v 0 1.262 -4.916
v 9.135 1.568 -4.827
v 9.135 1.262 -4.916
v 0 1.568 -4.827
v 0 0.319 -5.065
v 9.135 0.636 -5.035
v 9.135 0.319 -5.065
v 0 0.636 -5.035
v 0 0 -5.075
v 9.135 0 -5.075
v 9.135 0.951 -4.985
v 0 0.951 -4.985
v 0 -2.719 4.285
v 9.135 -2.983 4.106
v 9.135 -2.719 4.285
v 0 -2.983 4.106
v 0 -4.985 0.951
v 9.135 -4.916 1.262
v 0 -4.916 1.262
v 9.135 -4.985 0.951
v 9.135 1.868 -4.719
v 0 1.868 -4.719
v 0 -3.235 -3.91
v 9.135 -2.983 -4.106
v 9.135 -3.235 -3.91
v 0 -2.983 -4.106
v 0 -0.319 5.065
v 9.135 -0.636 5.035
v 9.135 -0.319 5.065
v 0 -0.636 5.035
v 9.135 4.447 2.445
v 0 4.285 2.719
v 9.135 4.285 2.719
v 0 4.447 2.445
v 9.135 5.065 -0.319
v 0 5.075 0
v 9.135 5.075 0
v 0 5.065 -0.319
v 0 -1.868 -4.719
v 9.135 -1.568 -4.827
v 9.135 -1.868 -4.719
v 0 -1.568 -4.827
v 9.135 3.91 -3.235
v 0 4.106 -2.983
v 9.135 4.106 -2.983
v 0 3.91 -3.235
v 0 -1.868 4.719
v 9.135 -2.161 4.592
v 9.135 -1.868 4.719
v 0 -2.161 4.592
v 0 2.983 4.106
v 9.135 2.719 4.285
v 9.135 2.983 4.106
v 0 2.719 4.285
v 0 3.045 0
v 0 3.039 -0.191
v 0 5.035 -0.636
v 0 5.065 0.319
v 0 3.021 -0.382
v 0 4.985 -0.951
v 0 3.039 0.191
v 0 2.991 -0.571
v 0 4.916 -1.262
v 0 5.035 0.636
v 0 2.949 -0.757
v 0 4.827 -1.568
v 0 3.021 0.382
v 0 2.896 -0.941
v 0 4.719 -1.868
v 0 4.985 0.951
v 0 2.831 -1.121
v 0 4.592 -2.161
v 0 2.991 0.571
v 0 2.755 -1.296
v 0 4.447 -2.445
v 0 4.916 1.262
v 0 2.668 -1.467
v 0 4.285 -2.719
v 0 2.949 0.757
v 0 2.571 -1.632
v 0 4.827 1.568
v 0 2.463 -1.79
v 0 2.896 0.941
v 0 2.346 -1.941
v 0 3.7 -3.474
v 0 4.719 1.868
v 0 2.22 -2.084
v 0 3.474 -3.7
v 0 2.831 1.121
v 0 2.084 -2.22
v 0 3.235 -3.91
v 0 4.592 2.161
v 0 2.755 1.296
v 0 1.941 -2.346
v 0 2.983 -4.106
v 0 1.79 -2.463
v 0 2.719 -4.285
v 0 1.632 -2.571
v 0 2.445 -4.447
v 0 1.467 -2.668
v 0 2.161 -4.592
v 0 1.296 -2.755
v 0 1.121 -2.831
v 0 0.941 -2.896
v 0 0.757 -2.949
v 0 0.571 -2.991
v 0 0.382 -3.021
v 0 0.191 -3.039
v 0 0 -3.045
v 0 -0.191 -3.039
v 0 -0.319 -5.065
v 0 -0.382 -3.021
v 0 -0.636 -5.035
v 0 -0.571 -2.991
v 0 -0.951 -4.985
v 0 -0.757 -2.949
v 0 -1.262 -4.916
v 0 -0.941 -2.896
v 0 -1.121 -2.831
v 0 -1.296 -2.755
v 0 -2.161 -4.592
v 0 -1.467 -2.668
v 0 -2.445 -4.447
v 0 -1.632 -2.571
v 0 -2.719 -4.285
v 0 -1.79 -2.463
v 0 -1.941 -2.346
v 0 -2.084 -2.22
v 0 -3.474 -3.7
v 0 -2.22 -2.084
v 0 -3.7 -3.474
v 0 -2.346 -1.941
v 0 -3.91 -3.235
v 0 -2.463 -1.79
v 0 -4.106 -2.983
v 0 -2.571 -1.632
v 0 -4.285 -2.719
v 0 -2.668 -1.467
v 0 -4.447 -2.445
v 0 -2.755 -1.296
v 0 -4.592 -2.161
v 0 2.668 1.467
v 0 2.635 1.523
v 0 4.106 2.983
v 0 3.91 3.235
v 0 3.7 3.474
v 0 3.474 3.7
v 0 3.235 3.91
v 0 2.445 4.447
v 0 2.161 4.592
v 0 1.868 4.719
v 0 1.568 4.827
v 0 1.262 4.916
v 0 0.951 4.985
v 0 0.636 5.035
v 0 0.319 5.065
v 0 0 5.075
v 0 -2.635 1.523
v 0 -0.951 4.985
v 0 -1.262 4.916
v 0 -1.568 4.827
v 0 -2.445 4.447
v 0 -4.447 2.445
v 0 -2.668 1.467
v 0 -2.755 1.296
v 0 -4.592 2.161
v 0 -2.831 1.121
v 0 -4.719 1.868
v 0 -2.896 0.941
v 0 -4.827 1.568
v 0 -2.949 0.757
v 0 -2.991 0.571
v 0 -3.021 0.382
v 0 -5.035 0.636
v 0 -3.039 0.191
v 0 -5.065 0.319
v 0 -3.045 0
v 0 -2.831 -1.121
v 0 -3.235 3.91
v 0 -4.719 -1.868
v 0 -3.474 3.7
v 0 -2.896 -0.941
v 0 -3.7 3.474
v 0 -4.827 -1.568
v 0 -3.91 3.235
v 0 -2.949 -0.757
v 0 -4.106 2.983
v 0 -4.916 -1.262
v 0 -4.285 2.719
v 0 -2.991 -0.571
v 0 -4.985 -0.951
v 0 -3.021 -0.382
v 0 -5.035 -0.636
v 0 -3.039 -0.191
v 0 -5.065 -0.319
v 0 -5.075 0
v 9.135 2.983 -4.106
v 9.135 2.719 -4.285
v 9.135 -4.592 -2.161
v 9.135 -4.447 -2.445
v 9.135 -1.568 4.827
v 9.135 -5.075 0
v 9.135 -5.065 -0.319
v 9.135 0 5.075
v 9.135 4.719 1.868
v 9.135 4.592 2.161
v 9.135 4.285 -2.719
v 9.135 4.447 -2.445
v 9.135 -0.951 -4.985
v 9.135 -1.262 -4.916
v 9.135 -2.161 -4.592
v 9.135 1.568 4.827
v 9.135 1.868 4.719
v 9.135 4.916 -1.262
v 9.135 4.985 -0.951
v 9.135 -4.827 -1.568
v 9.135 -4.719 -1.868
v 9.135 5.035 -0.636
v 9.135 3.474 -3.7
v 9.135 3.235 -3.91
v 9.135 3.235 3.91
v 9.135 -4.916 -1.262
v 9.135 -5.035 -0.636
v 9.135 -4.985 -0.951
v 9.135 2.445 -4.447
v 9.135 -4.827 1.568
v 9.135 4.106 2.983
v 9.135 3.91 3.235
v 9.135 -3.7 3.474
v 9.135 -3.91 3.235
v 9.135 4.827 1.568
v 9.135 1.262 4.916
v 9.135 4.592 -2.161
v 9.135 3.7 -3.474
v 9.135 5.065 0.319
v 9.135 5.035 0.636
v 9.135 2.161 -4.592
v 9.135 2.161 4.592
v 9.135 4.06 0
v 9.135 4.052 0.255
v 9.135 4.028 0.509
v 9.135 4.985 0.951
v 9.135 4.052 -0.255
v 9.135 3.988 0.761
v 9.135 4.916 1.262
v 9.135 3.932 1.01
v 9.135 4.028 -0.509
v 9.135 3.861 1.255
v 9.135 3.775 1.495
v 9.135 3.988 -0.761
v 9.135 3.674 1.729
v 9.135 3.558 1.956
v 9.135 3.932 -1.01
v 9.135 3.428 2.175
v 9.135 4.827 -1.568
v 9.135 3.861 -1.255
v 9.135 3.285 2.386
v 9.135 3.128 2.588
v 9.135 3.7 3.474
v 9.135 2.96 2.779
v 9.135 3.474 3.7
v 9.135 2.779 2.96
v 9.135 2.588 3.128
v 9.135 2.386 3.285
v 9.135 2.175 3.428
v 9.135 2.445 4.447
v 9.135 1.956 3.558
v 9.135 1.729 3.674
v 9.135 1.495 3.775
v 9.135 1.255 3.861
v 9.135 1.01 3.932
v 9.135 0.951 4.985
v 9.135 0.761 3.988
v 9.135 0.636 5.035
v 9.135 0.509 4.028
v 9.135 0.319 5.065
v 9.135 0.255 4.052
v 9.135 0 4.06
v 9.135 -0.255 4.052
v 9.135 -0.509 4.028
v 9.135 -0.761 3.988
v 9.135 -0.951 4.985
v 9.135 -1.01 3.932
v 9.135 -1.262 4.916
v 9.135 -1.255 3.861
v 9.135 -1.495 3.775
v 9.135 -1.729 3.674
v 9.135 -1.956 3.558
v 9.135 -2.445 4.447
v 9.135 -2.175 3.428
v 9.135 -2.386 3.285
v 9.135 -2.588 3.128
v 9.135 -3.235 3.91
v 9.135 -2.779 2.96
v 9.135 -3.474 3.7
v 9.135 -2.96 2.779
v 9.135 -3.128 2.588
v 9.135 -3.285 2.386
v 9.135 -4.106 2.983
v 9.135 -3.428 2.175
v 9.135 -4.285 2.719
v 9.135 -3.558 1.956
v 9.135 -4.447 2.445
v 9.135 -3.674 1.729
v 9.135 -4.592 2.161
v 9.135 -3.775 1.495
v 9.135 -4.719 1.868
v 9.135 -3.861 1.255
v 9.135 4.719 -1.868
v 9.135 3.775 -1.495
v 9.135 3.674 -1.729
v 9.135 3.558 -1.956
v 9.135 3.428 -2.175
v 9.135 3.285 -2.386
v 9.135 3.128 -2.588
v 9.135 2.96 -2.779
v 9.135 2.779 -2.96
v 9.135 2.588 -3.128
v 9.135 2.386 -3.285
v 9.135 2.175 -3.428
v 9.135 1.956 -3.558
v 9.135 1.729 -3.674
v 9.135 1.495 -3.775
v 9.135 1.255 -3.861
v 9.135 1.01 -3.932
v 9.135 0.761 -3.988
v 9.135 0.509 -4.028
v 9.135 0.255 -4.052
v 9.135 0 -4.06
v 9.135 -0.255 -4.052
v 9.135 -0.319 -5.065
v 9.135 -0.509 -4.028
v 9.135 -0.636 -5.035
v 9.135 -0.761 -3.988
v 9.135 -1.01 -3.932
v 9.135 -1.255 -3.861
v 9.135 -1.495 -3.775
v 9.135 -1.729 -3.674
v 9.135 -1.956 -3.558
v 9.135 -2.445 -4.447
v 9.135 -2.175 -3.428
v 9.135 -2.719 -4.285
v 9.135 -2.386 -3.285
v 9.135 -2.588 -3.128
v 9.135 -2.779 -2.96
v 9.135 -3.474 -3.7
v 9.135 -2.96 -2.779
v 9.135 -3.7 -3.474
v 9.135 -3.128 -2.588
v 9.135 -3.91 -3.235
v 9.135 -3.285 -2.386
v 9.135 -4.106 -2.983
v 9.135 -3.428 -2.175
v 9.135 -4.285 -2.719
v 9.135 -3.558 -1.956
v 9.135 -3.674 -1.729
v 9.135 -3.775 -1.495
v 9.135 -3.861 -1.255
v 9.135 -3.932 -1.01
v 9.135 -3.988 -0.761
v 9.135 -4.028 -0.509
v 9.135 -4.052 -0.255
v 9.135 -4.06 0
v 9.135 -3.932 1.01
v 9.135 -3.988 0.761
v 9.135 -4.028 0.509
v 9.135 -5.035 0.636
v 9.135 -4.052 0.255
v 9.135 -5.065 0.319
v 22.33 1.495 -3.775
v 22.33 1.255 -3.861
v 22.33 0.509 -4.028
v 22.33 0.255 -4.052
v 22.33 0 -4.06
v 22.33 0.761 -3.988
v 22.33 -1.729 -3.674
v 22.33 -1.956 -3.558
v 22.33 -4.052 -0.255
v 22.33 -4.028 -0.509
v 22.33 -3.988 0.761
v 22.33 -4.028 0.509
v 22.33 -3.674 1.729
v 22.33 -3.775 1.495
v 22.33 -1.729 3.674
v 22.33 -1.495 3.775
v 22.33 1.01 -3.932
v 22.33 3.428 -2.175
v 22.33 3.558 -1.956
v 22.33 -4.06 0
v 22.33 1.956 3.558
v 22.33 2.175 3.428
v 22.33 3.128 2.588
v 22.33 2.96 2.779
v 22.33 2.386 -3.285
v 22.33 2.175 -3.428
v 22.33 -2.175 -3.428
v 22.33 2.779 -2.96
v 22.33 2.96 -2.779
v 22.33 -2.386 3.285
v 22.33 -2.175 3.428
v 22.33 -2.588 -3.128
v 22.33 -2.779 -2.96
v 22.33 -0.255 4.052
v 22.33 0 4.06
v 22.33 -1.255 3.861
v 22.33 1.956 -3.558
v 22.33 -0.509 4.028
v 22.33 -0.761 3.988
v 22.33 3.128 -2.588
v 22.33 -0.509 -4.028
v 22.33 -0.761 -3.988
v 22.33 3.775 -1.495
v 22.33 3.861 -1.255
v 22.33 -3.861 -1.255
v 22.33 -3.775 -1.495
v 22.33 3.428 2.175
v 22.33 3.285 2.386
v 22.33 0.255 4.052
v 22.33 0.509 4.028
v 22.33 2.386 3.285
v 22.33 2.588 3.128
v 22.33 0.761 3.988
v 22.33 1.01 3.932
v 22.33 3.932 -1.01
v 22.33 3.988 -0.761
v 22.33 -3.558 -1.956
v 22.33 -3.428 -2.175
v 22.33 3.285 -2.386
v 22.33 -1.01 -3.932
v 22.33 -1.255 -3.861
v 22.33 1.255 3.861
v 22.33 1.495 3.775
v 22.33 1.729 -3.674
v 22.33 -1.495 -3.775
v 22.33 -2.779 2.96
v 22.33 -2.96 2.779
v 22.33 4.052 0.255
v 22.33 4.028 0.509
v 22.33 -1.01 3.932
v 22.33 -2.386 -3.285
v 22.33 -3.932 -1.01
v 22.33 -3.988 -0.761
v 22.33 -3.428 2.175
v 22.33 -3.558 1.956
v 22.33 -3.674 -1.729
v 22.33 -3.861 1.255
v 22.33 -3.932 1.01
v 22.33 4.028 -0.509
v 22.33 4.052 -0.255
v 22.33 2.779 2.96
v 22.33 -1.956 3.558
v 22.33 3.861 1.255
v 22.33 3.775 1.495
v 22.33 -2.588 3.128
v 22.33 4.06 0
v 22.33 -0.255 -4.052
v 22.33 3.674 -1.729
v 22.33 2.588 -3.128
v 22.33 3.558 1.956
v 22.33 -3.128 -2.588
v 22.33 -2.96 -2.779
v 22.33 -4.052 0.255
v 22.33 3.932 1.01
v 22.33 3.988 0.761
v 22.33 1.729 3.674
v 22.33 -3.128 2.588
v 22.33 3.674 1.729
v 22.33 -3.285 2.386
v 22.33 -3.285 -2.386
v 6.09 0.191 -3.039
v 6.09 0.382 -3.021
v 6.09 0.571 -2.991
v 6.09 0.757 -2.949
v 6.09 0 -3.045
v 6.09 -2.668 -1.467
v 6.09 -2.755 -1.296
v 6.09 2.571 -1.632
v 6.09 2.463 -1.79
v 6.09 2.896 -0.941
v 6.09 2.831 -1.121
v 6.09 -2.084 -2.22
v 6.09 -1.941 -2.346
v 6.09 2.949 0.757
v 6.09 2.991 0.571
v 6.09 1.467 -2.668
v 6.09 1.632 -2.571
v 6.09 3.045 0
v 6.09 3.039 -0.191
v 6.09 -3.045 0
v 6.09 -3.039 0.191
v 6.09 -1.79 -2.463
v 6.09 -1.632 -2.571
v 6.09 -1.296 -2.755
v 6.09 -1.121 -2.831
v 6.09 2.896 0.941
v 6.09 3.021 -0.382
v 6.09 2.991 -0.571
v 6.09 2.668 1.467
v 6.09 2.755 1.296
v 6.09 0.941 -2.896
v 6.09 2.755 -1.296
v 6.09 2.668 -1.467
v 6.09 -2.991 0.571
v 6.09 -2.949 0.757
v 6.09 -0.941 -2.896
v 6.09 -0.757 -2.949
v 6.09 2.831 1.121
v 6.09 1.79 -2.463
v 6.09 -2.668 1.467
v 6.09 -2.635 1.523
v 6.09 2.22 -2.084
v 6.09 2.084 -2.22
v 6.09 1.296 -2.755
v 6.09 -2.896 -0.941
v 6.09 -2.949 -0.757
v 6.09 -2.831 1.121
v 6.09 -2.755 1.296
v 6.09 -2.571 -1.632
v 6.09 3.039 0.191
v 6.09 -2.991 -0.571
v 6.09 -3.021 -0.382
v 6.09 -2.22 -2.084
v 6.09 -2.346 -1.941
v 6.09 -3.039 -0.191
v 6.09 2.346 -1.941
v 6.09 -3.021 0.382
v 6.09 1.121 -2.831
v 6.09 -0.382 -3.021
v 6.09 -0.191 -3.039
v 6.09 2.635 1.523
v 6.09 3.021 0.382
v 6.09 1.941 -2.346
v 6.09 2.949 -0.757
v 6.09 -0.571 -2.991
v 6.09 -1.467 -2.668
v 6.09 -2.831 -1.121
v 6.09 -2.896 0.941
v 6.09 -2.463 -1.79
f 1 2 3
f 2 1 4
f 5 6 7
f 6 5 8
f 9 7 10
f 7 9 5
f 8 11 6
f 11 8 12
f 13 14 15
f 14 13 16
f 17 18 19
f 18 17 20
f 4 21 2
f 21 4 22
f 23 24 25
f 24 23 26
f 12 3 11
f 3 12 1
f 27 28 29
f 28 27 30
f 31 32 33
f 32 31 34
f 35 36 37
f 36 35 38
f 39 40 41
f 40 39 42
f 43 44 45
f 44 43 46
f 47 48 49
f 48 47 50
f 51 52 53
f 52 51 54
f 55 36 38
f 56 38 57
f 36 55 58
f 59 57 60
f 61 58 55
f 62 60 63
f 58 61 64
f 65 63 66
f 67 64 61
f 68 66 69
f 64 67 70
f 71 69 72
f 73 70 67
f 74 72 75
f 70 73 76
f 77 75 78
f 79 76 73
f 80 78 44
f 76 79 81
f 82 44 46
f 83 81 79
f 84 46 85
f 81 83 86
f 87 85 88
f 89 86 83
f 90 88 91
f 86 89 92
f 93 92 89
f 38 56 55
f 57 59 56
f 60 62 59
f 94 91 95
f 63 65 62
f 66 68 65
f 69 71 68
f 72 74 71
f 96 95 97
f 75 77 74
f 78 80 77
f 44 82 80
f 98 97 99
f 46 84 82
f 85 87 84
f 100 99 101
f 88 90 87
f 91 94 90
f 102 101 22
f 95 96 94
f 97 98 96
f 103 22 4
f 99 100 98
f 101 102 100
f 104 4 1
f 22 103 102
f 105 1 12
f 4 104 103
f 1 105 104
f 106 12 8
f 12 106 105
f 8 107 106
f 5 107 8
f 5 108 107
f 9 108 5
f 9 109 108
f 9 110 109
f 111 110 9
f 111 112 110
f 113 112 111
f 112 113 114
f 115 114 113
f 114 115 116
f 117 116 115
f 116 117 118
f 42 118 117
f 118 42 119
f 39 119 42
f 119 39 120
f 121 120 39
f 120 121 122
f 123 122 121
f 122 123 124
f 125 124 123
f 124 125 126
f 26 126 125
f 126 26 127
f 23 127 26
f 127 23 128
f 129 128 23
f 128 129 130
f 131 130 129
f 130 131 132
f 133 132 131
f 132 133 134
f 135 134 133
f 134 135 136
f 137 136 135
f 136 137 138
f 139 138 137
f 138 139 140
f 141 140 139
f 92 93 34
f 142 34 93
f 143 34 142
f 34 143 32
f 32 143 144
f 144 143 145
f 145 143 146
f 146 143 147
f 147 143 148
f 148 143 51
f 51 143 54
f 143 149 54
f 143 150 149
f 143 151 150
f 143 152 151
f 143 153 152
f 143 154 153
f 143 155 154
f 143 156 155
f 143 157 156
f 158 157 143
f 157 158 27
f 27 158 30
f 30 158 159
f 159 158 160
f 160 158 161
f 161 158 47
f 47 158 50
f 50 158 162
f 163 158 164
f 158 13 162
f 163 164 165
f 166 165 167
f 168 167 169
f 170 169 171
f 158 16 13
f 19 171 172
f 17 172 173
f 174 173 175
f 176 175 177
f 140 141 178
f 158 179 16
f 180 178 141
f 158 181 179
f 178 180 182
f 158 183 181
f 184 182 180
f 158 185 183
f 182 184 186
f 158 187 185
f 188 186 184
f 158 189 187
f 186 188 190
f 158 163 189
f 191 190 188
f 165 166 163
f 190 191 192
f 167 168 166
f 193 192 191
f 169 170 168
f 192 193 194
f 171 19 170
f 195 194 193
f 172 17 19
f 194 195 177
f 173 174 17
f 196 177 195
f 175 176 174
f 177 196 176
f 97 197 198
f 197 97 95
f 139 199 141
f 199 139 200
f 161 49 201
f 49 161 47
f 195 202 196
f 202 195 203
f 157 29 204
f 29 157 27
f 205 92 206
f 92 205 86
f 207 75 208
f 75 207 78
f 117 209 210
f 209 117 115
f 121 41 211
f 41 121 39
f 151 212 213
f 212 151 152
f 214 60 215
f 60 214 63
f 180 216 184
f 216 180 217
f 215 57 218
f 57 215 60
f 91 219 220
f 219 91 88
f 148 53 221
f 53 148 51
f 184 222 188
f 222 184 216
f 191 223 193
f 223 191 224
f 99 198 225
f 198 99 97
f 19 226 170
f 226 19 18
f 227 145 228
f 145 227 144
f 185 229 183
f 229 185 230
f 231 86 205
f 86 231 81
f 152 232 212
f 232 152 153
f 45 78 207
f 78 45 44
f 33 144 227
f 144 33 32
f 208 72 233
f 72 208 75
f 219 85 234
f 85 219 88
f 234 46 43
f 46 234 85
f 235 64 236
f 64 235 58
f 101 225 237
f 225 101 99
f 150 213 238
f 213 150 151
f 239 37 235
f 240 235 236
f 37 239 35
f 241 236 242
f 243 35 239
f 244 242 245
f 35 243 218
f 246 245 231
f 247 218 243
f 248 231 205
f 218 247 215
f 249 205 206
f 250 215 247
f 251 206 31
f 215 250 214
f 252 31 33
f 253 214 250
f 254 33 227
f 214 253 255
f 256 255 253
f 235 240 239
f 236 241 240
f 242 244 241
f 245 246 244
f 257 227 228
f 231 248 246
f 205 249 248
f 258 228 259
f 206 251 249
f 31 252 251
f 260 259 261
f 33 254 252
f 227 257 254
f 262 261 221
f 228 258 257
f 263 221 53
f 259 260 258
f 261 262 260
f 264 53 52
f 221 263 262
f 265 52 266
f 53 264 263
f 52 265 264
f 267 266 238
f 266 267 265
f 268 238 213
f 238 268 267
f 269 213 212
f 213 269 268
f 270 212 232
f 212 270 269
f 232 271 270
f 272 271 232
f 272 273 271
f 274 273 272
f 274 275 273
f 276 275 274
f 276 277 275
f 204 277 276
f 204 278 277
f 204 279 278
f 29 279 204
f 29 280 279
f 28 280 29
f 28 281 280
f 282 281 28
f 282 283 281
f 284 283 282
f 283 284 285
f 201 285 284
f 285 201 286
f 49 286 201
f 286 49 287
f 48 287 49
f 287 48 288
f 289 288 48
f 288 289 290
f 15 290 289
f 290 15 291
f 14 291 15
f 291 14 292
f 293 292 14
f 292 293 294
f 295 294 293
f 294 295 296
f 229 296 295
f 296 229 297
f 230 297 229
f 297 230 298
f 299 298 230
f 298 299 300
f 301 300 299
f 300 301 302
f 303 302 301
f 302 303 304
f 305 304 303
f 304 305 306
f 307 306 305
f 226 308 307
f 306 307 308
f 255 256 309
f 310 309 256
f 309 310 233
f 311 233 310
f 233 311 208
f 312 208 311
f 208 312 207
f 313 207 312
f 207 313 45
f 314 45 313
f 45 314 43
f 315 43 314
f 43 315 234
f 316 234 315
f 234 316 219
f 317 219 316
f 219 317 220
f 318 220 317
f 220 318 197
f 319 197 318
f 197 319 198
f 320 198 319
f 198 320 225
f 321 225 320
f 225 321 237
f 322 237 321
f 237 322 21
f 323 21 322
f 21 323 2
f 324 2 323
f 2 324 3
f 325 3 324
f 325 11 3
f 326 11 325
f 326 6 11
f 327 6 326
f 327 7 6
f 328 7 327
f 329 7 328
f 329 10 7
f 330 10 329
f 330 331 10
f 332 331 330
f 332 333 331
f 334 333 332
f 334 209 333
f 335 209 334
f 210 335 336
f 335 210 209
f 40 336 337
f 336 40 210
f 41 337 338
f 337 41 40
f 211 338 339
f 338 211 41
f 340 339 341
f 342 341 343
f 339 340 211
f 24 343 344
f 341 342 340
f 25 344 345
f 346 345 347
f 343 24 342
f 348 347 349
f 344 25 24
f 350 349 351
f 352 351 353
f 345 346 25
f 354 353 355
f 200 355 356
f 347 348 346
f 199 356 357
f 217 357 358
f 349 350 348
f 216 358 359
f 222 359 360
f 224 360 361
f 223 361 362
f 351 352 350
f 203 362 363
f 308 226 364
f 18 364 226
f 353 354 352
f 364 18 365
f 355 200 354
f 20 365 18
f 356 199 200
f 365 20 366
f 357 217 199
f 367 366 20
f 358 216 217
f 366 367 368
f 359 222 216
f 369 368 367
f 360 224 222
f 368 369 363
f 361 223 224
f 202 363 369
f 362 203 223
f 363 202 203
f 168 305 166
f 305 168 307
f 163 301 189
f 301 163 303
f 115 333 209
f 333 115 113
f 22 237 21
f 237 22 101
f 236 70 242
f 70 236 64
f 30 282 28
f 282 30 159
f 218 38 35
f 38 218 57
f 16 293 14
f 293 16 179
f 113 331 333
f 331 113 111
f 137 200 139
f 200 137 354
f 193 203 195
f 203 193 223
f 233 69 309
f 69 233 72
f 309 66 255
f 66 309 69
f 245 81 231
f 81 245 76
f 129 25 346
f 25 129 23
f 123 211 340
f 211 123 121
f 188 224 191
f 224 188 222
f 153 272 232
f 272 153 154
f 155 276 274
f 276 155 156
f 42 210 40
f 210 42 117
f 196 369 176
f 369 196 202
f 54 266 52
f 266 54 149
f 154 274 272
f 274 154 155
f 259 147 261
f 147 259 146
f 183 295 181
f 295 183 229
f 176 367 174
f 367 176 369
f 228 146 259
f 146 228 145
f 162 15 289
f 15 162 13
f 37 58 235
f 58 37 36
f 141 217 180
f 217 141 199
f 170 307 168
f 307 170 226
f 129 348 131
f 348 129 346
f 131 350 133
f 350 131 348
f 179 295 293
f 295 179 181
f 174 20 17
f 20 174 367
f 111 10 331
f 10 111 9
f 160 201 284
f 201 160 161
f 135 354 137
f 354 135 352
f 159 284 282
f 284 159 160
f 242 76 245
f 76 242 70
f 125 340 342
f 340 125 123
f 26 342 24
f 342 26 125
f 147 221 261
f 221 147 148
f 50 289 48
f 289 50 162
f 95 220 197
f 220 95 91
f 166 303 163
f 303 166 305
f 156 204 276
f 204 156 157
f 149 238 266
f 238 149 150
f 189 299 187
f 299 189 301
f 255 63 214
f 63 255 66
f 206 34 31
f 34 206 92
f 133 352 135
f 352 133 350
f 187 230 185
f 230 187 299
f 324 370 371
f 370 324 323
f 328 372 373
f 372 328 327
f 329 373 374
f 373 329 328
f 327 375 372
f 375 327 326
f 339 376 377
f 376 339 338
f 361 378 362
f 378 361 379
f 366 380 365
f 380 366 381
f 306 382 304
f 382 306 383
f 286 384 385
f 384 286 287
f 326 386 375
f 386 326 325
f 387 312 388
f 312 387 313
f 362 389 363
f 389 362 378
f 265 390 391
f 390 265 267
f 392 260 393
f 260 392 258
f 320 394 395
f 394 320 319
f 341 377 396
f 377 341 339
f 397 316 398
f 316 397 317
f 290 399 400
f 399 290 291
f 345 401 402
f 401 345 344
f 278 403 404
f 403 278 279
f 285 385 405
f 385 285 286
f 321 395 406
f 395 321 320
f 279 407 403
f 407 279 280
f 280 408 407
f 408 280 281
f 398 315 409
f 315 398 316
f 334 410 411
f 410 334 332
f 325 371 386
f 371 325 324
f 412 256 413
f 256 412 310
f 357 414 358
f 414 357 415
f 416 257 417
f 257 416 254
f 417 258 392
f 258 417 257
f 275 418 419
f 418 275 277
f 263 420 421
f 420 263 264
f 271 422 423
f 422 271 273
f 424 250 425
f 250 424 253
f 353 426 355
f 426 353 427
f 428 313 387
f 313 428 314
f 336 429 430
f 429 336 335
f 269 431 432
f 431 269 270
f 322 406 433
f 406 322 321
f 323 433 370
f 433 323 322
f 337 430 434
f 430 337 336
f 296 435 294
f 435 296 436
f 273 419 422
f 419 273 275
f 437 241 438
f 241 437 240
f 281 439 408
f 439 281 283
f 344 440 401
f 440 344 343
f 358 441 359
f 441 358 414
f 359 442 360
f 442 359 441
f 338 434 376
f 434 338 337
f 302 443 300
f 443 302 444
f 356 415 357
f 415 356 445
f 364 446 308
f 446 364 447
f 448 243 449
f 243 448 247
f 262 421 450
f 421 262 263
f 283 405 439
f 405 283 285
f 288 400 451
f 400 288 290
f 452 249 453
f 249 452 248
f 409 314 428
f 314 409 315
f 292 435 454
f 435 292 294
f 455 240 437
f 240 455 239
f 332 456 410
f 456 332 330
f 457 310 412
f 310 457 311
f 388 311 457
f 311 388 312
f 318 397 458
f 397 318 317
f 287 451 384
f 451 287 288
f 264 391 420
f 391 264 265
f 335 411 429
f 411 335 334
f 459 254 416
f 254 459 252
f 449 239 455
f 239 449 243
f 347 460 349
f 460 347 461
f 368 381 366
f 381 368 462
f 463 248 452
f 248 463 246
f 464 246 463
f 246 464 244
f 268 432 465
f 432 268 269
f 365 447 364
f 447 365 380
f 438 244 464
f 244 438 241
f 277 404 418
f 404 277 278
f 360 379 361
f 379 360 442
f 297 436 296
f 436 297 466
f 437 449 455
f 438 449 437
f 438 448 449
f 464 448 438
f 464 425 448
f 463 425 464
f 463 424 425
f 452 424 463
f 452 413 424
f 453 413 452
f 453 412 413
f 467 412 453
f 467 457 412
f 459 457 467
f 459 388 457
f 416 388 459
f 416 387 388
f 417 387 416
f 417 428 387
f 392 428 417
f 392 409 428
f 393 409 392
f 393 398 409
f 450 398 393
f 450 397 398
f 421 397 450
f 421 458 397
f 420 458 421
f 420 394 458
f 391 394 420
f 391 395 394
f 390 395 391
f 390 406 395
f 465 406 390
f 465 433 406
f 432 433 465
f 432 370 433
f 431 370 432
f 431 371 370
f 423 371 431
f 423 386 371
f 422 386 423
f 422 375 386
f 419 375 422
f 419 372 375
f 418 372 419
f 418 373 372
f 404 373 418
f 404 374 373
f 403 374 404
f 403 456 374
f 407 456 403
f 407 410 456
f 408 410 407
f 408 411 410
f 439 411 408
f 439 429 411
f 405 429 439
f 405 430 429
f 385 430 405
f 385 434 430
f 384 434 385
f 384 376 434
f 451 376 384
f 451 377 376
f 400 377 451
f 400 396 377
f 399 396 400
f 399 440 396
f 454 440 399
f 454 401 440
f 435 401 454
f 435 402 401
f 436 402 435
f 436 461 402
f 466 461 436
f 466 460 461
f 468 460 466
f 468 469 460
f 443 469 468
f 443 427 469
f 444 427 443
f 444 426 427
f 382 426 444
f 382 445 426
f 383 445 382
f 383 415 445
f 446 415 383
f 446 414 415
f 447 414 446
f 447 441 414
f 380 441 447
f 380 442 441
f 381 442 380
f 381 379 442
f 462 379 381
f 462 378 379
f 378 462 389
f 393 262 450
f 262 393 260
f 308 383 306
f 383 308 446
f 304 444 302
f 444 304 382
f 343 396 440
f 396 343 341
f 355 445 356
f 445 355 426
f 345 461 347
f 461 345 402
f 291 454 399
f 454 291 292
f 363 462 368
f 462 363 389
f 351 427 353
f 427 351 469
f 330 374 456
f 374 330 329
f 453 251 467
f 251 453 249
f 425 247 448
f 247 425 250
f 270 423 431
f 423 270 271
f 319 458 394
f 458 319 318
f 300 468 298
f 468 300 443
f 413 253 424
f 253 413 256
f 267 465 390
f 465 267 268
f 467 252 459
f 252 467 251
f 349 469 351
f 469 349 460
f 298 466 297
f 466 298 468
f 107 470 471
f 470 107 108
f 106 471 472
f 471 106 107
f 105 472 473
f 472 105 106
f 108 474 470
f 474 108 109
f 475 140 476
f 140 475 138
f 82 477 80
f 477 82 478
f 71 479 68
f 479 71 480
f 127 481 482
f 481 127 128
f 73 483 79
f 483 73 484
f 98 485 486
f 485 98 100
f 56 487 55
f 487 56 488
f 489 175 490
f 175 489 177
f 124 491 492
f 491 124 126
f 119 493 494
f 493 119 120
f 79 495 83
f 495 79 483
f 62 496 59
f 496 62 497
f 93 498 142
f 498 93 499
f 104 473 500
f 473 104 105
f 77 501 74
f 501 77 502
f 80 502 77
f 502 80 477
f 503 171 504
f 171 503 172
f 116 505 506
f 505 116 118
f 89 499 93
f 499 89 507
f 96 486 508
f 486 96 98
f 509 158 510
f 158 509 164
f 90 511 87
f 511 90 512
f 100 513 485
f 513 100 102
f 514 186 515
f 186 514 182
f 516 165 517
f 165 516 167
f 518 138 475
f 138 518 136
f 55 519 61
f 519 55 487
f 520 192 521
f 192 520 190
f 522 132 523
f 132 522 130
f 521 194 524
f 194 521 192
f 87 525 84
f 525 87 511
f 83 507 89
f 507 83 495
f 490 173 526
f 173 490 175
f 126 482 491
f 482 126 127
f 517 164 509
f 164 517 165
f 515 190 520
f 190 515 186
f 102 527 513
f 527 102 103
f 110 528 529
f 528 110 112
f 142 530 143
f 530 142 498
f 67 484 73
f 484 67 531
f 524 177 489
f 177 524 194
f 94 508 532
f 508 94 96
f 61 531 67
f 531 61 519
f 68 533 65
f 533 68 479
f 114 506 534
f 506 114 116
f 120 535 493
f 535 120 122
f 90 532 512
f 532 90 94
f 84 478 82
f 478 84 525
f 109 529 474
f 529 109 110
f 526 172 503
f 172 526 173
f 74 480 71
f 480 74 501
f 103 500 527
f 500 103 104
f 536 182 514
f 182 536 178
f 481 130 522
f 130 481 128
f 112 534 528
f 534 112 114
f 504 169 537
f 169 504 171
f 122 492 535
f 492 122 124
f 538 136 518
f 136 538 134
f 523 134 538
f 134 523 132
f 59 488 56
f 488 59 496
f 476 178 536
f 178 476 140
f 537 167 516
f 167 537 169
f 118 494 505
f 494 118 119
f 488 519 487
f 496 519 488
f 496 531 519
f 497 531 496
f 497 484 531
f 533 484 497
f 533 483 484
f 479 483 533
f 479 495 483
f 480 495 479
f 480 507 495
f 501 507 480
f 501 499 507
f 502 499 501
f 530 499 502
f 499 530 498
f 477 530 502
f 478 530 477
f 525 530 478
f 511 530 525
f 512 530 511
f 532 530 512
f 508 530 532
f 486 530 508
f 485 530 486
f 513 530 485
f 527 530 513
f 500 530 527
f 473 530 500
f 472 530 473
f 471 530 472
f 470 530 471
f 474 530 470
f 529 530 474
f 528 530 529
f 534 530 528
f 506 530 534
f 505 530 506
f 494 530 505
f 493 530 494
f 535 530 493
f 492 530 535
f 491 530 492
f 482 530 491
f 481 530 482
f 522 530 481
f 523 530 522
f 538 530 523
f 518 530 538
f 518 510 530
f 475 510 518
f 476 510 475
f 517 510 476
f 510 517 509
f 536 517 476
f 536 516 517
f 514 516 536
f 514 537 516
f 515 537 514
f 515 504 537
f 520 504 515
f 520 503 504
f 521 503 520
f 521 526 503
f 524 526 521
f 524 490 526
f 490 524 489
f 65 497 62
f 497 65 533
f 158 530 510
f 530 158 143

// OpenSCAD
$fn=100;
// printing factor for shrinkage
f = 1.015;

module encoder_shaft() {
    // 6mm with a 
    difference() {
    rotate([0,90,0]) cylinder(h=6, d=6);
    translate([0,-3,1.5]) cube([6,6,3]);
    }
 }
 
 scale([f,f,f])  difference() {   
   rotate([0,90,0]) union() {
        cylinder(h=(6+3), d=10);
        translate([0,0,6+3])cylinder(h=(7+6), d=8);
   }
   encoder_shaft();
 }
